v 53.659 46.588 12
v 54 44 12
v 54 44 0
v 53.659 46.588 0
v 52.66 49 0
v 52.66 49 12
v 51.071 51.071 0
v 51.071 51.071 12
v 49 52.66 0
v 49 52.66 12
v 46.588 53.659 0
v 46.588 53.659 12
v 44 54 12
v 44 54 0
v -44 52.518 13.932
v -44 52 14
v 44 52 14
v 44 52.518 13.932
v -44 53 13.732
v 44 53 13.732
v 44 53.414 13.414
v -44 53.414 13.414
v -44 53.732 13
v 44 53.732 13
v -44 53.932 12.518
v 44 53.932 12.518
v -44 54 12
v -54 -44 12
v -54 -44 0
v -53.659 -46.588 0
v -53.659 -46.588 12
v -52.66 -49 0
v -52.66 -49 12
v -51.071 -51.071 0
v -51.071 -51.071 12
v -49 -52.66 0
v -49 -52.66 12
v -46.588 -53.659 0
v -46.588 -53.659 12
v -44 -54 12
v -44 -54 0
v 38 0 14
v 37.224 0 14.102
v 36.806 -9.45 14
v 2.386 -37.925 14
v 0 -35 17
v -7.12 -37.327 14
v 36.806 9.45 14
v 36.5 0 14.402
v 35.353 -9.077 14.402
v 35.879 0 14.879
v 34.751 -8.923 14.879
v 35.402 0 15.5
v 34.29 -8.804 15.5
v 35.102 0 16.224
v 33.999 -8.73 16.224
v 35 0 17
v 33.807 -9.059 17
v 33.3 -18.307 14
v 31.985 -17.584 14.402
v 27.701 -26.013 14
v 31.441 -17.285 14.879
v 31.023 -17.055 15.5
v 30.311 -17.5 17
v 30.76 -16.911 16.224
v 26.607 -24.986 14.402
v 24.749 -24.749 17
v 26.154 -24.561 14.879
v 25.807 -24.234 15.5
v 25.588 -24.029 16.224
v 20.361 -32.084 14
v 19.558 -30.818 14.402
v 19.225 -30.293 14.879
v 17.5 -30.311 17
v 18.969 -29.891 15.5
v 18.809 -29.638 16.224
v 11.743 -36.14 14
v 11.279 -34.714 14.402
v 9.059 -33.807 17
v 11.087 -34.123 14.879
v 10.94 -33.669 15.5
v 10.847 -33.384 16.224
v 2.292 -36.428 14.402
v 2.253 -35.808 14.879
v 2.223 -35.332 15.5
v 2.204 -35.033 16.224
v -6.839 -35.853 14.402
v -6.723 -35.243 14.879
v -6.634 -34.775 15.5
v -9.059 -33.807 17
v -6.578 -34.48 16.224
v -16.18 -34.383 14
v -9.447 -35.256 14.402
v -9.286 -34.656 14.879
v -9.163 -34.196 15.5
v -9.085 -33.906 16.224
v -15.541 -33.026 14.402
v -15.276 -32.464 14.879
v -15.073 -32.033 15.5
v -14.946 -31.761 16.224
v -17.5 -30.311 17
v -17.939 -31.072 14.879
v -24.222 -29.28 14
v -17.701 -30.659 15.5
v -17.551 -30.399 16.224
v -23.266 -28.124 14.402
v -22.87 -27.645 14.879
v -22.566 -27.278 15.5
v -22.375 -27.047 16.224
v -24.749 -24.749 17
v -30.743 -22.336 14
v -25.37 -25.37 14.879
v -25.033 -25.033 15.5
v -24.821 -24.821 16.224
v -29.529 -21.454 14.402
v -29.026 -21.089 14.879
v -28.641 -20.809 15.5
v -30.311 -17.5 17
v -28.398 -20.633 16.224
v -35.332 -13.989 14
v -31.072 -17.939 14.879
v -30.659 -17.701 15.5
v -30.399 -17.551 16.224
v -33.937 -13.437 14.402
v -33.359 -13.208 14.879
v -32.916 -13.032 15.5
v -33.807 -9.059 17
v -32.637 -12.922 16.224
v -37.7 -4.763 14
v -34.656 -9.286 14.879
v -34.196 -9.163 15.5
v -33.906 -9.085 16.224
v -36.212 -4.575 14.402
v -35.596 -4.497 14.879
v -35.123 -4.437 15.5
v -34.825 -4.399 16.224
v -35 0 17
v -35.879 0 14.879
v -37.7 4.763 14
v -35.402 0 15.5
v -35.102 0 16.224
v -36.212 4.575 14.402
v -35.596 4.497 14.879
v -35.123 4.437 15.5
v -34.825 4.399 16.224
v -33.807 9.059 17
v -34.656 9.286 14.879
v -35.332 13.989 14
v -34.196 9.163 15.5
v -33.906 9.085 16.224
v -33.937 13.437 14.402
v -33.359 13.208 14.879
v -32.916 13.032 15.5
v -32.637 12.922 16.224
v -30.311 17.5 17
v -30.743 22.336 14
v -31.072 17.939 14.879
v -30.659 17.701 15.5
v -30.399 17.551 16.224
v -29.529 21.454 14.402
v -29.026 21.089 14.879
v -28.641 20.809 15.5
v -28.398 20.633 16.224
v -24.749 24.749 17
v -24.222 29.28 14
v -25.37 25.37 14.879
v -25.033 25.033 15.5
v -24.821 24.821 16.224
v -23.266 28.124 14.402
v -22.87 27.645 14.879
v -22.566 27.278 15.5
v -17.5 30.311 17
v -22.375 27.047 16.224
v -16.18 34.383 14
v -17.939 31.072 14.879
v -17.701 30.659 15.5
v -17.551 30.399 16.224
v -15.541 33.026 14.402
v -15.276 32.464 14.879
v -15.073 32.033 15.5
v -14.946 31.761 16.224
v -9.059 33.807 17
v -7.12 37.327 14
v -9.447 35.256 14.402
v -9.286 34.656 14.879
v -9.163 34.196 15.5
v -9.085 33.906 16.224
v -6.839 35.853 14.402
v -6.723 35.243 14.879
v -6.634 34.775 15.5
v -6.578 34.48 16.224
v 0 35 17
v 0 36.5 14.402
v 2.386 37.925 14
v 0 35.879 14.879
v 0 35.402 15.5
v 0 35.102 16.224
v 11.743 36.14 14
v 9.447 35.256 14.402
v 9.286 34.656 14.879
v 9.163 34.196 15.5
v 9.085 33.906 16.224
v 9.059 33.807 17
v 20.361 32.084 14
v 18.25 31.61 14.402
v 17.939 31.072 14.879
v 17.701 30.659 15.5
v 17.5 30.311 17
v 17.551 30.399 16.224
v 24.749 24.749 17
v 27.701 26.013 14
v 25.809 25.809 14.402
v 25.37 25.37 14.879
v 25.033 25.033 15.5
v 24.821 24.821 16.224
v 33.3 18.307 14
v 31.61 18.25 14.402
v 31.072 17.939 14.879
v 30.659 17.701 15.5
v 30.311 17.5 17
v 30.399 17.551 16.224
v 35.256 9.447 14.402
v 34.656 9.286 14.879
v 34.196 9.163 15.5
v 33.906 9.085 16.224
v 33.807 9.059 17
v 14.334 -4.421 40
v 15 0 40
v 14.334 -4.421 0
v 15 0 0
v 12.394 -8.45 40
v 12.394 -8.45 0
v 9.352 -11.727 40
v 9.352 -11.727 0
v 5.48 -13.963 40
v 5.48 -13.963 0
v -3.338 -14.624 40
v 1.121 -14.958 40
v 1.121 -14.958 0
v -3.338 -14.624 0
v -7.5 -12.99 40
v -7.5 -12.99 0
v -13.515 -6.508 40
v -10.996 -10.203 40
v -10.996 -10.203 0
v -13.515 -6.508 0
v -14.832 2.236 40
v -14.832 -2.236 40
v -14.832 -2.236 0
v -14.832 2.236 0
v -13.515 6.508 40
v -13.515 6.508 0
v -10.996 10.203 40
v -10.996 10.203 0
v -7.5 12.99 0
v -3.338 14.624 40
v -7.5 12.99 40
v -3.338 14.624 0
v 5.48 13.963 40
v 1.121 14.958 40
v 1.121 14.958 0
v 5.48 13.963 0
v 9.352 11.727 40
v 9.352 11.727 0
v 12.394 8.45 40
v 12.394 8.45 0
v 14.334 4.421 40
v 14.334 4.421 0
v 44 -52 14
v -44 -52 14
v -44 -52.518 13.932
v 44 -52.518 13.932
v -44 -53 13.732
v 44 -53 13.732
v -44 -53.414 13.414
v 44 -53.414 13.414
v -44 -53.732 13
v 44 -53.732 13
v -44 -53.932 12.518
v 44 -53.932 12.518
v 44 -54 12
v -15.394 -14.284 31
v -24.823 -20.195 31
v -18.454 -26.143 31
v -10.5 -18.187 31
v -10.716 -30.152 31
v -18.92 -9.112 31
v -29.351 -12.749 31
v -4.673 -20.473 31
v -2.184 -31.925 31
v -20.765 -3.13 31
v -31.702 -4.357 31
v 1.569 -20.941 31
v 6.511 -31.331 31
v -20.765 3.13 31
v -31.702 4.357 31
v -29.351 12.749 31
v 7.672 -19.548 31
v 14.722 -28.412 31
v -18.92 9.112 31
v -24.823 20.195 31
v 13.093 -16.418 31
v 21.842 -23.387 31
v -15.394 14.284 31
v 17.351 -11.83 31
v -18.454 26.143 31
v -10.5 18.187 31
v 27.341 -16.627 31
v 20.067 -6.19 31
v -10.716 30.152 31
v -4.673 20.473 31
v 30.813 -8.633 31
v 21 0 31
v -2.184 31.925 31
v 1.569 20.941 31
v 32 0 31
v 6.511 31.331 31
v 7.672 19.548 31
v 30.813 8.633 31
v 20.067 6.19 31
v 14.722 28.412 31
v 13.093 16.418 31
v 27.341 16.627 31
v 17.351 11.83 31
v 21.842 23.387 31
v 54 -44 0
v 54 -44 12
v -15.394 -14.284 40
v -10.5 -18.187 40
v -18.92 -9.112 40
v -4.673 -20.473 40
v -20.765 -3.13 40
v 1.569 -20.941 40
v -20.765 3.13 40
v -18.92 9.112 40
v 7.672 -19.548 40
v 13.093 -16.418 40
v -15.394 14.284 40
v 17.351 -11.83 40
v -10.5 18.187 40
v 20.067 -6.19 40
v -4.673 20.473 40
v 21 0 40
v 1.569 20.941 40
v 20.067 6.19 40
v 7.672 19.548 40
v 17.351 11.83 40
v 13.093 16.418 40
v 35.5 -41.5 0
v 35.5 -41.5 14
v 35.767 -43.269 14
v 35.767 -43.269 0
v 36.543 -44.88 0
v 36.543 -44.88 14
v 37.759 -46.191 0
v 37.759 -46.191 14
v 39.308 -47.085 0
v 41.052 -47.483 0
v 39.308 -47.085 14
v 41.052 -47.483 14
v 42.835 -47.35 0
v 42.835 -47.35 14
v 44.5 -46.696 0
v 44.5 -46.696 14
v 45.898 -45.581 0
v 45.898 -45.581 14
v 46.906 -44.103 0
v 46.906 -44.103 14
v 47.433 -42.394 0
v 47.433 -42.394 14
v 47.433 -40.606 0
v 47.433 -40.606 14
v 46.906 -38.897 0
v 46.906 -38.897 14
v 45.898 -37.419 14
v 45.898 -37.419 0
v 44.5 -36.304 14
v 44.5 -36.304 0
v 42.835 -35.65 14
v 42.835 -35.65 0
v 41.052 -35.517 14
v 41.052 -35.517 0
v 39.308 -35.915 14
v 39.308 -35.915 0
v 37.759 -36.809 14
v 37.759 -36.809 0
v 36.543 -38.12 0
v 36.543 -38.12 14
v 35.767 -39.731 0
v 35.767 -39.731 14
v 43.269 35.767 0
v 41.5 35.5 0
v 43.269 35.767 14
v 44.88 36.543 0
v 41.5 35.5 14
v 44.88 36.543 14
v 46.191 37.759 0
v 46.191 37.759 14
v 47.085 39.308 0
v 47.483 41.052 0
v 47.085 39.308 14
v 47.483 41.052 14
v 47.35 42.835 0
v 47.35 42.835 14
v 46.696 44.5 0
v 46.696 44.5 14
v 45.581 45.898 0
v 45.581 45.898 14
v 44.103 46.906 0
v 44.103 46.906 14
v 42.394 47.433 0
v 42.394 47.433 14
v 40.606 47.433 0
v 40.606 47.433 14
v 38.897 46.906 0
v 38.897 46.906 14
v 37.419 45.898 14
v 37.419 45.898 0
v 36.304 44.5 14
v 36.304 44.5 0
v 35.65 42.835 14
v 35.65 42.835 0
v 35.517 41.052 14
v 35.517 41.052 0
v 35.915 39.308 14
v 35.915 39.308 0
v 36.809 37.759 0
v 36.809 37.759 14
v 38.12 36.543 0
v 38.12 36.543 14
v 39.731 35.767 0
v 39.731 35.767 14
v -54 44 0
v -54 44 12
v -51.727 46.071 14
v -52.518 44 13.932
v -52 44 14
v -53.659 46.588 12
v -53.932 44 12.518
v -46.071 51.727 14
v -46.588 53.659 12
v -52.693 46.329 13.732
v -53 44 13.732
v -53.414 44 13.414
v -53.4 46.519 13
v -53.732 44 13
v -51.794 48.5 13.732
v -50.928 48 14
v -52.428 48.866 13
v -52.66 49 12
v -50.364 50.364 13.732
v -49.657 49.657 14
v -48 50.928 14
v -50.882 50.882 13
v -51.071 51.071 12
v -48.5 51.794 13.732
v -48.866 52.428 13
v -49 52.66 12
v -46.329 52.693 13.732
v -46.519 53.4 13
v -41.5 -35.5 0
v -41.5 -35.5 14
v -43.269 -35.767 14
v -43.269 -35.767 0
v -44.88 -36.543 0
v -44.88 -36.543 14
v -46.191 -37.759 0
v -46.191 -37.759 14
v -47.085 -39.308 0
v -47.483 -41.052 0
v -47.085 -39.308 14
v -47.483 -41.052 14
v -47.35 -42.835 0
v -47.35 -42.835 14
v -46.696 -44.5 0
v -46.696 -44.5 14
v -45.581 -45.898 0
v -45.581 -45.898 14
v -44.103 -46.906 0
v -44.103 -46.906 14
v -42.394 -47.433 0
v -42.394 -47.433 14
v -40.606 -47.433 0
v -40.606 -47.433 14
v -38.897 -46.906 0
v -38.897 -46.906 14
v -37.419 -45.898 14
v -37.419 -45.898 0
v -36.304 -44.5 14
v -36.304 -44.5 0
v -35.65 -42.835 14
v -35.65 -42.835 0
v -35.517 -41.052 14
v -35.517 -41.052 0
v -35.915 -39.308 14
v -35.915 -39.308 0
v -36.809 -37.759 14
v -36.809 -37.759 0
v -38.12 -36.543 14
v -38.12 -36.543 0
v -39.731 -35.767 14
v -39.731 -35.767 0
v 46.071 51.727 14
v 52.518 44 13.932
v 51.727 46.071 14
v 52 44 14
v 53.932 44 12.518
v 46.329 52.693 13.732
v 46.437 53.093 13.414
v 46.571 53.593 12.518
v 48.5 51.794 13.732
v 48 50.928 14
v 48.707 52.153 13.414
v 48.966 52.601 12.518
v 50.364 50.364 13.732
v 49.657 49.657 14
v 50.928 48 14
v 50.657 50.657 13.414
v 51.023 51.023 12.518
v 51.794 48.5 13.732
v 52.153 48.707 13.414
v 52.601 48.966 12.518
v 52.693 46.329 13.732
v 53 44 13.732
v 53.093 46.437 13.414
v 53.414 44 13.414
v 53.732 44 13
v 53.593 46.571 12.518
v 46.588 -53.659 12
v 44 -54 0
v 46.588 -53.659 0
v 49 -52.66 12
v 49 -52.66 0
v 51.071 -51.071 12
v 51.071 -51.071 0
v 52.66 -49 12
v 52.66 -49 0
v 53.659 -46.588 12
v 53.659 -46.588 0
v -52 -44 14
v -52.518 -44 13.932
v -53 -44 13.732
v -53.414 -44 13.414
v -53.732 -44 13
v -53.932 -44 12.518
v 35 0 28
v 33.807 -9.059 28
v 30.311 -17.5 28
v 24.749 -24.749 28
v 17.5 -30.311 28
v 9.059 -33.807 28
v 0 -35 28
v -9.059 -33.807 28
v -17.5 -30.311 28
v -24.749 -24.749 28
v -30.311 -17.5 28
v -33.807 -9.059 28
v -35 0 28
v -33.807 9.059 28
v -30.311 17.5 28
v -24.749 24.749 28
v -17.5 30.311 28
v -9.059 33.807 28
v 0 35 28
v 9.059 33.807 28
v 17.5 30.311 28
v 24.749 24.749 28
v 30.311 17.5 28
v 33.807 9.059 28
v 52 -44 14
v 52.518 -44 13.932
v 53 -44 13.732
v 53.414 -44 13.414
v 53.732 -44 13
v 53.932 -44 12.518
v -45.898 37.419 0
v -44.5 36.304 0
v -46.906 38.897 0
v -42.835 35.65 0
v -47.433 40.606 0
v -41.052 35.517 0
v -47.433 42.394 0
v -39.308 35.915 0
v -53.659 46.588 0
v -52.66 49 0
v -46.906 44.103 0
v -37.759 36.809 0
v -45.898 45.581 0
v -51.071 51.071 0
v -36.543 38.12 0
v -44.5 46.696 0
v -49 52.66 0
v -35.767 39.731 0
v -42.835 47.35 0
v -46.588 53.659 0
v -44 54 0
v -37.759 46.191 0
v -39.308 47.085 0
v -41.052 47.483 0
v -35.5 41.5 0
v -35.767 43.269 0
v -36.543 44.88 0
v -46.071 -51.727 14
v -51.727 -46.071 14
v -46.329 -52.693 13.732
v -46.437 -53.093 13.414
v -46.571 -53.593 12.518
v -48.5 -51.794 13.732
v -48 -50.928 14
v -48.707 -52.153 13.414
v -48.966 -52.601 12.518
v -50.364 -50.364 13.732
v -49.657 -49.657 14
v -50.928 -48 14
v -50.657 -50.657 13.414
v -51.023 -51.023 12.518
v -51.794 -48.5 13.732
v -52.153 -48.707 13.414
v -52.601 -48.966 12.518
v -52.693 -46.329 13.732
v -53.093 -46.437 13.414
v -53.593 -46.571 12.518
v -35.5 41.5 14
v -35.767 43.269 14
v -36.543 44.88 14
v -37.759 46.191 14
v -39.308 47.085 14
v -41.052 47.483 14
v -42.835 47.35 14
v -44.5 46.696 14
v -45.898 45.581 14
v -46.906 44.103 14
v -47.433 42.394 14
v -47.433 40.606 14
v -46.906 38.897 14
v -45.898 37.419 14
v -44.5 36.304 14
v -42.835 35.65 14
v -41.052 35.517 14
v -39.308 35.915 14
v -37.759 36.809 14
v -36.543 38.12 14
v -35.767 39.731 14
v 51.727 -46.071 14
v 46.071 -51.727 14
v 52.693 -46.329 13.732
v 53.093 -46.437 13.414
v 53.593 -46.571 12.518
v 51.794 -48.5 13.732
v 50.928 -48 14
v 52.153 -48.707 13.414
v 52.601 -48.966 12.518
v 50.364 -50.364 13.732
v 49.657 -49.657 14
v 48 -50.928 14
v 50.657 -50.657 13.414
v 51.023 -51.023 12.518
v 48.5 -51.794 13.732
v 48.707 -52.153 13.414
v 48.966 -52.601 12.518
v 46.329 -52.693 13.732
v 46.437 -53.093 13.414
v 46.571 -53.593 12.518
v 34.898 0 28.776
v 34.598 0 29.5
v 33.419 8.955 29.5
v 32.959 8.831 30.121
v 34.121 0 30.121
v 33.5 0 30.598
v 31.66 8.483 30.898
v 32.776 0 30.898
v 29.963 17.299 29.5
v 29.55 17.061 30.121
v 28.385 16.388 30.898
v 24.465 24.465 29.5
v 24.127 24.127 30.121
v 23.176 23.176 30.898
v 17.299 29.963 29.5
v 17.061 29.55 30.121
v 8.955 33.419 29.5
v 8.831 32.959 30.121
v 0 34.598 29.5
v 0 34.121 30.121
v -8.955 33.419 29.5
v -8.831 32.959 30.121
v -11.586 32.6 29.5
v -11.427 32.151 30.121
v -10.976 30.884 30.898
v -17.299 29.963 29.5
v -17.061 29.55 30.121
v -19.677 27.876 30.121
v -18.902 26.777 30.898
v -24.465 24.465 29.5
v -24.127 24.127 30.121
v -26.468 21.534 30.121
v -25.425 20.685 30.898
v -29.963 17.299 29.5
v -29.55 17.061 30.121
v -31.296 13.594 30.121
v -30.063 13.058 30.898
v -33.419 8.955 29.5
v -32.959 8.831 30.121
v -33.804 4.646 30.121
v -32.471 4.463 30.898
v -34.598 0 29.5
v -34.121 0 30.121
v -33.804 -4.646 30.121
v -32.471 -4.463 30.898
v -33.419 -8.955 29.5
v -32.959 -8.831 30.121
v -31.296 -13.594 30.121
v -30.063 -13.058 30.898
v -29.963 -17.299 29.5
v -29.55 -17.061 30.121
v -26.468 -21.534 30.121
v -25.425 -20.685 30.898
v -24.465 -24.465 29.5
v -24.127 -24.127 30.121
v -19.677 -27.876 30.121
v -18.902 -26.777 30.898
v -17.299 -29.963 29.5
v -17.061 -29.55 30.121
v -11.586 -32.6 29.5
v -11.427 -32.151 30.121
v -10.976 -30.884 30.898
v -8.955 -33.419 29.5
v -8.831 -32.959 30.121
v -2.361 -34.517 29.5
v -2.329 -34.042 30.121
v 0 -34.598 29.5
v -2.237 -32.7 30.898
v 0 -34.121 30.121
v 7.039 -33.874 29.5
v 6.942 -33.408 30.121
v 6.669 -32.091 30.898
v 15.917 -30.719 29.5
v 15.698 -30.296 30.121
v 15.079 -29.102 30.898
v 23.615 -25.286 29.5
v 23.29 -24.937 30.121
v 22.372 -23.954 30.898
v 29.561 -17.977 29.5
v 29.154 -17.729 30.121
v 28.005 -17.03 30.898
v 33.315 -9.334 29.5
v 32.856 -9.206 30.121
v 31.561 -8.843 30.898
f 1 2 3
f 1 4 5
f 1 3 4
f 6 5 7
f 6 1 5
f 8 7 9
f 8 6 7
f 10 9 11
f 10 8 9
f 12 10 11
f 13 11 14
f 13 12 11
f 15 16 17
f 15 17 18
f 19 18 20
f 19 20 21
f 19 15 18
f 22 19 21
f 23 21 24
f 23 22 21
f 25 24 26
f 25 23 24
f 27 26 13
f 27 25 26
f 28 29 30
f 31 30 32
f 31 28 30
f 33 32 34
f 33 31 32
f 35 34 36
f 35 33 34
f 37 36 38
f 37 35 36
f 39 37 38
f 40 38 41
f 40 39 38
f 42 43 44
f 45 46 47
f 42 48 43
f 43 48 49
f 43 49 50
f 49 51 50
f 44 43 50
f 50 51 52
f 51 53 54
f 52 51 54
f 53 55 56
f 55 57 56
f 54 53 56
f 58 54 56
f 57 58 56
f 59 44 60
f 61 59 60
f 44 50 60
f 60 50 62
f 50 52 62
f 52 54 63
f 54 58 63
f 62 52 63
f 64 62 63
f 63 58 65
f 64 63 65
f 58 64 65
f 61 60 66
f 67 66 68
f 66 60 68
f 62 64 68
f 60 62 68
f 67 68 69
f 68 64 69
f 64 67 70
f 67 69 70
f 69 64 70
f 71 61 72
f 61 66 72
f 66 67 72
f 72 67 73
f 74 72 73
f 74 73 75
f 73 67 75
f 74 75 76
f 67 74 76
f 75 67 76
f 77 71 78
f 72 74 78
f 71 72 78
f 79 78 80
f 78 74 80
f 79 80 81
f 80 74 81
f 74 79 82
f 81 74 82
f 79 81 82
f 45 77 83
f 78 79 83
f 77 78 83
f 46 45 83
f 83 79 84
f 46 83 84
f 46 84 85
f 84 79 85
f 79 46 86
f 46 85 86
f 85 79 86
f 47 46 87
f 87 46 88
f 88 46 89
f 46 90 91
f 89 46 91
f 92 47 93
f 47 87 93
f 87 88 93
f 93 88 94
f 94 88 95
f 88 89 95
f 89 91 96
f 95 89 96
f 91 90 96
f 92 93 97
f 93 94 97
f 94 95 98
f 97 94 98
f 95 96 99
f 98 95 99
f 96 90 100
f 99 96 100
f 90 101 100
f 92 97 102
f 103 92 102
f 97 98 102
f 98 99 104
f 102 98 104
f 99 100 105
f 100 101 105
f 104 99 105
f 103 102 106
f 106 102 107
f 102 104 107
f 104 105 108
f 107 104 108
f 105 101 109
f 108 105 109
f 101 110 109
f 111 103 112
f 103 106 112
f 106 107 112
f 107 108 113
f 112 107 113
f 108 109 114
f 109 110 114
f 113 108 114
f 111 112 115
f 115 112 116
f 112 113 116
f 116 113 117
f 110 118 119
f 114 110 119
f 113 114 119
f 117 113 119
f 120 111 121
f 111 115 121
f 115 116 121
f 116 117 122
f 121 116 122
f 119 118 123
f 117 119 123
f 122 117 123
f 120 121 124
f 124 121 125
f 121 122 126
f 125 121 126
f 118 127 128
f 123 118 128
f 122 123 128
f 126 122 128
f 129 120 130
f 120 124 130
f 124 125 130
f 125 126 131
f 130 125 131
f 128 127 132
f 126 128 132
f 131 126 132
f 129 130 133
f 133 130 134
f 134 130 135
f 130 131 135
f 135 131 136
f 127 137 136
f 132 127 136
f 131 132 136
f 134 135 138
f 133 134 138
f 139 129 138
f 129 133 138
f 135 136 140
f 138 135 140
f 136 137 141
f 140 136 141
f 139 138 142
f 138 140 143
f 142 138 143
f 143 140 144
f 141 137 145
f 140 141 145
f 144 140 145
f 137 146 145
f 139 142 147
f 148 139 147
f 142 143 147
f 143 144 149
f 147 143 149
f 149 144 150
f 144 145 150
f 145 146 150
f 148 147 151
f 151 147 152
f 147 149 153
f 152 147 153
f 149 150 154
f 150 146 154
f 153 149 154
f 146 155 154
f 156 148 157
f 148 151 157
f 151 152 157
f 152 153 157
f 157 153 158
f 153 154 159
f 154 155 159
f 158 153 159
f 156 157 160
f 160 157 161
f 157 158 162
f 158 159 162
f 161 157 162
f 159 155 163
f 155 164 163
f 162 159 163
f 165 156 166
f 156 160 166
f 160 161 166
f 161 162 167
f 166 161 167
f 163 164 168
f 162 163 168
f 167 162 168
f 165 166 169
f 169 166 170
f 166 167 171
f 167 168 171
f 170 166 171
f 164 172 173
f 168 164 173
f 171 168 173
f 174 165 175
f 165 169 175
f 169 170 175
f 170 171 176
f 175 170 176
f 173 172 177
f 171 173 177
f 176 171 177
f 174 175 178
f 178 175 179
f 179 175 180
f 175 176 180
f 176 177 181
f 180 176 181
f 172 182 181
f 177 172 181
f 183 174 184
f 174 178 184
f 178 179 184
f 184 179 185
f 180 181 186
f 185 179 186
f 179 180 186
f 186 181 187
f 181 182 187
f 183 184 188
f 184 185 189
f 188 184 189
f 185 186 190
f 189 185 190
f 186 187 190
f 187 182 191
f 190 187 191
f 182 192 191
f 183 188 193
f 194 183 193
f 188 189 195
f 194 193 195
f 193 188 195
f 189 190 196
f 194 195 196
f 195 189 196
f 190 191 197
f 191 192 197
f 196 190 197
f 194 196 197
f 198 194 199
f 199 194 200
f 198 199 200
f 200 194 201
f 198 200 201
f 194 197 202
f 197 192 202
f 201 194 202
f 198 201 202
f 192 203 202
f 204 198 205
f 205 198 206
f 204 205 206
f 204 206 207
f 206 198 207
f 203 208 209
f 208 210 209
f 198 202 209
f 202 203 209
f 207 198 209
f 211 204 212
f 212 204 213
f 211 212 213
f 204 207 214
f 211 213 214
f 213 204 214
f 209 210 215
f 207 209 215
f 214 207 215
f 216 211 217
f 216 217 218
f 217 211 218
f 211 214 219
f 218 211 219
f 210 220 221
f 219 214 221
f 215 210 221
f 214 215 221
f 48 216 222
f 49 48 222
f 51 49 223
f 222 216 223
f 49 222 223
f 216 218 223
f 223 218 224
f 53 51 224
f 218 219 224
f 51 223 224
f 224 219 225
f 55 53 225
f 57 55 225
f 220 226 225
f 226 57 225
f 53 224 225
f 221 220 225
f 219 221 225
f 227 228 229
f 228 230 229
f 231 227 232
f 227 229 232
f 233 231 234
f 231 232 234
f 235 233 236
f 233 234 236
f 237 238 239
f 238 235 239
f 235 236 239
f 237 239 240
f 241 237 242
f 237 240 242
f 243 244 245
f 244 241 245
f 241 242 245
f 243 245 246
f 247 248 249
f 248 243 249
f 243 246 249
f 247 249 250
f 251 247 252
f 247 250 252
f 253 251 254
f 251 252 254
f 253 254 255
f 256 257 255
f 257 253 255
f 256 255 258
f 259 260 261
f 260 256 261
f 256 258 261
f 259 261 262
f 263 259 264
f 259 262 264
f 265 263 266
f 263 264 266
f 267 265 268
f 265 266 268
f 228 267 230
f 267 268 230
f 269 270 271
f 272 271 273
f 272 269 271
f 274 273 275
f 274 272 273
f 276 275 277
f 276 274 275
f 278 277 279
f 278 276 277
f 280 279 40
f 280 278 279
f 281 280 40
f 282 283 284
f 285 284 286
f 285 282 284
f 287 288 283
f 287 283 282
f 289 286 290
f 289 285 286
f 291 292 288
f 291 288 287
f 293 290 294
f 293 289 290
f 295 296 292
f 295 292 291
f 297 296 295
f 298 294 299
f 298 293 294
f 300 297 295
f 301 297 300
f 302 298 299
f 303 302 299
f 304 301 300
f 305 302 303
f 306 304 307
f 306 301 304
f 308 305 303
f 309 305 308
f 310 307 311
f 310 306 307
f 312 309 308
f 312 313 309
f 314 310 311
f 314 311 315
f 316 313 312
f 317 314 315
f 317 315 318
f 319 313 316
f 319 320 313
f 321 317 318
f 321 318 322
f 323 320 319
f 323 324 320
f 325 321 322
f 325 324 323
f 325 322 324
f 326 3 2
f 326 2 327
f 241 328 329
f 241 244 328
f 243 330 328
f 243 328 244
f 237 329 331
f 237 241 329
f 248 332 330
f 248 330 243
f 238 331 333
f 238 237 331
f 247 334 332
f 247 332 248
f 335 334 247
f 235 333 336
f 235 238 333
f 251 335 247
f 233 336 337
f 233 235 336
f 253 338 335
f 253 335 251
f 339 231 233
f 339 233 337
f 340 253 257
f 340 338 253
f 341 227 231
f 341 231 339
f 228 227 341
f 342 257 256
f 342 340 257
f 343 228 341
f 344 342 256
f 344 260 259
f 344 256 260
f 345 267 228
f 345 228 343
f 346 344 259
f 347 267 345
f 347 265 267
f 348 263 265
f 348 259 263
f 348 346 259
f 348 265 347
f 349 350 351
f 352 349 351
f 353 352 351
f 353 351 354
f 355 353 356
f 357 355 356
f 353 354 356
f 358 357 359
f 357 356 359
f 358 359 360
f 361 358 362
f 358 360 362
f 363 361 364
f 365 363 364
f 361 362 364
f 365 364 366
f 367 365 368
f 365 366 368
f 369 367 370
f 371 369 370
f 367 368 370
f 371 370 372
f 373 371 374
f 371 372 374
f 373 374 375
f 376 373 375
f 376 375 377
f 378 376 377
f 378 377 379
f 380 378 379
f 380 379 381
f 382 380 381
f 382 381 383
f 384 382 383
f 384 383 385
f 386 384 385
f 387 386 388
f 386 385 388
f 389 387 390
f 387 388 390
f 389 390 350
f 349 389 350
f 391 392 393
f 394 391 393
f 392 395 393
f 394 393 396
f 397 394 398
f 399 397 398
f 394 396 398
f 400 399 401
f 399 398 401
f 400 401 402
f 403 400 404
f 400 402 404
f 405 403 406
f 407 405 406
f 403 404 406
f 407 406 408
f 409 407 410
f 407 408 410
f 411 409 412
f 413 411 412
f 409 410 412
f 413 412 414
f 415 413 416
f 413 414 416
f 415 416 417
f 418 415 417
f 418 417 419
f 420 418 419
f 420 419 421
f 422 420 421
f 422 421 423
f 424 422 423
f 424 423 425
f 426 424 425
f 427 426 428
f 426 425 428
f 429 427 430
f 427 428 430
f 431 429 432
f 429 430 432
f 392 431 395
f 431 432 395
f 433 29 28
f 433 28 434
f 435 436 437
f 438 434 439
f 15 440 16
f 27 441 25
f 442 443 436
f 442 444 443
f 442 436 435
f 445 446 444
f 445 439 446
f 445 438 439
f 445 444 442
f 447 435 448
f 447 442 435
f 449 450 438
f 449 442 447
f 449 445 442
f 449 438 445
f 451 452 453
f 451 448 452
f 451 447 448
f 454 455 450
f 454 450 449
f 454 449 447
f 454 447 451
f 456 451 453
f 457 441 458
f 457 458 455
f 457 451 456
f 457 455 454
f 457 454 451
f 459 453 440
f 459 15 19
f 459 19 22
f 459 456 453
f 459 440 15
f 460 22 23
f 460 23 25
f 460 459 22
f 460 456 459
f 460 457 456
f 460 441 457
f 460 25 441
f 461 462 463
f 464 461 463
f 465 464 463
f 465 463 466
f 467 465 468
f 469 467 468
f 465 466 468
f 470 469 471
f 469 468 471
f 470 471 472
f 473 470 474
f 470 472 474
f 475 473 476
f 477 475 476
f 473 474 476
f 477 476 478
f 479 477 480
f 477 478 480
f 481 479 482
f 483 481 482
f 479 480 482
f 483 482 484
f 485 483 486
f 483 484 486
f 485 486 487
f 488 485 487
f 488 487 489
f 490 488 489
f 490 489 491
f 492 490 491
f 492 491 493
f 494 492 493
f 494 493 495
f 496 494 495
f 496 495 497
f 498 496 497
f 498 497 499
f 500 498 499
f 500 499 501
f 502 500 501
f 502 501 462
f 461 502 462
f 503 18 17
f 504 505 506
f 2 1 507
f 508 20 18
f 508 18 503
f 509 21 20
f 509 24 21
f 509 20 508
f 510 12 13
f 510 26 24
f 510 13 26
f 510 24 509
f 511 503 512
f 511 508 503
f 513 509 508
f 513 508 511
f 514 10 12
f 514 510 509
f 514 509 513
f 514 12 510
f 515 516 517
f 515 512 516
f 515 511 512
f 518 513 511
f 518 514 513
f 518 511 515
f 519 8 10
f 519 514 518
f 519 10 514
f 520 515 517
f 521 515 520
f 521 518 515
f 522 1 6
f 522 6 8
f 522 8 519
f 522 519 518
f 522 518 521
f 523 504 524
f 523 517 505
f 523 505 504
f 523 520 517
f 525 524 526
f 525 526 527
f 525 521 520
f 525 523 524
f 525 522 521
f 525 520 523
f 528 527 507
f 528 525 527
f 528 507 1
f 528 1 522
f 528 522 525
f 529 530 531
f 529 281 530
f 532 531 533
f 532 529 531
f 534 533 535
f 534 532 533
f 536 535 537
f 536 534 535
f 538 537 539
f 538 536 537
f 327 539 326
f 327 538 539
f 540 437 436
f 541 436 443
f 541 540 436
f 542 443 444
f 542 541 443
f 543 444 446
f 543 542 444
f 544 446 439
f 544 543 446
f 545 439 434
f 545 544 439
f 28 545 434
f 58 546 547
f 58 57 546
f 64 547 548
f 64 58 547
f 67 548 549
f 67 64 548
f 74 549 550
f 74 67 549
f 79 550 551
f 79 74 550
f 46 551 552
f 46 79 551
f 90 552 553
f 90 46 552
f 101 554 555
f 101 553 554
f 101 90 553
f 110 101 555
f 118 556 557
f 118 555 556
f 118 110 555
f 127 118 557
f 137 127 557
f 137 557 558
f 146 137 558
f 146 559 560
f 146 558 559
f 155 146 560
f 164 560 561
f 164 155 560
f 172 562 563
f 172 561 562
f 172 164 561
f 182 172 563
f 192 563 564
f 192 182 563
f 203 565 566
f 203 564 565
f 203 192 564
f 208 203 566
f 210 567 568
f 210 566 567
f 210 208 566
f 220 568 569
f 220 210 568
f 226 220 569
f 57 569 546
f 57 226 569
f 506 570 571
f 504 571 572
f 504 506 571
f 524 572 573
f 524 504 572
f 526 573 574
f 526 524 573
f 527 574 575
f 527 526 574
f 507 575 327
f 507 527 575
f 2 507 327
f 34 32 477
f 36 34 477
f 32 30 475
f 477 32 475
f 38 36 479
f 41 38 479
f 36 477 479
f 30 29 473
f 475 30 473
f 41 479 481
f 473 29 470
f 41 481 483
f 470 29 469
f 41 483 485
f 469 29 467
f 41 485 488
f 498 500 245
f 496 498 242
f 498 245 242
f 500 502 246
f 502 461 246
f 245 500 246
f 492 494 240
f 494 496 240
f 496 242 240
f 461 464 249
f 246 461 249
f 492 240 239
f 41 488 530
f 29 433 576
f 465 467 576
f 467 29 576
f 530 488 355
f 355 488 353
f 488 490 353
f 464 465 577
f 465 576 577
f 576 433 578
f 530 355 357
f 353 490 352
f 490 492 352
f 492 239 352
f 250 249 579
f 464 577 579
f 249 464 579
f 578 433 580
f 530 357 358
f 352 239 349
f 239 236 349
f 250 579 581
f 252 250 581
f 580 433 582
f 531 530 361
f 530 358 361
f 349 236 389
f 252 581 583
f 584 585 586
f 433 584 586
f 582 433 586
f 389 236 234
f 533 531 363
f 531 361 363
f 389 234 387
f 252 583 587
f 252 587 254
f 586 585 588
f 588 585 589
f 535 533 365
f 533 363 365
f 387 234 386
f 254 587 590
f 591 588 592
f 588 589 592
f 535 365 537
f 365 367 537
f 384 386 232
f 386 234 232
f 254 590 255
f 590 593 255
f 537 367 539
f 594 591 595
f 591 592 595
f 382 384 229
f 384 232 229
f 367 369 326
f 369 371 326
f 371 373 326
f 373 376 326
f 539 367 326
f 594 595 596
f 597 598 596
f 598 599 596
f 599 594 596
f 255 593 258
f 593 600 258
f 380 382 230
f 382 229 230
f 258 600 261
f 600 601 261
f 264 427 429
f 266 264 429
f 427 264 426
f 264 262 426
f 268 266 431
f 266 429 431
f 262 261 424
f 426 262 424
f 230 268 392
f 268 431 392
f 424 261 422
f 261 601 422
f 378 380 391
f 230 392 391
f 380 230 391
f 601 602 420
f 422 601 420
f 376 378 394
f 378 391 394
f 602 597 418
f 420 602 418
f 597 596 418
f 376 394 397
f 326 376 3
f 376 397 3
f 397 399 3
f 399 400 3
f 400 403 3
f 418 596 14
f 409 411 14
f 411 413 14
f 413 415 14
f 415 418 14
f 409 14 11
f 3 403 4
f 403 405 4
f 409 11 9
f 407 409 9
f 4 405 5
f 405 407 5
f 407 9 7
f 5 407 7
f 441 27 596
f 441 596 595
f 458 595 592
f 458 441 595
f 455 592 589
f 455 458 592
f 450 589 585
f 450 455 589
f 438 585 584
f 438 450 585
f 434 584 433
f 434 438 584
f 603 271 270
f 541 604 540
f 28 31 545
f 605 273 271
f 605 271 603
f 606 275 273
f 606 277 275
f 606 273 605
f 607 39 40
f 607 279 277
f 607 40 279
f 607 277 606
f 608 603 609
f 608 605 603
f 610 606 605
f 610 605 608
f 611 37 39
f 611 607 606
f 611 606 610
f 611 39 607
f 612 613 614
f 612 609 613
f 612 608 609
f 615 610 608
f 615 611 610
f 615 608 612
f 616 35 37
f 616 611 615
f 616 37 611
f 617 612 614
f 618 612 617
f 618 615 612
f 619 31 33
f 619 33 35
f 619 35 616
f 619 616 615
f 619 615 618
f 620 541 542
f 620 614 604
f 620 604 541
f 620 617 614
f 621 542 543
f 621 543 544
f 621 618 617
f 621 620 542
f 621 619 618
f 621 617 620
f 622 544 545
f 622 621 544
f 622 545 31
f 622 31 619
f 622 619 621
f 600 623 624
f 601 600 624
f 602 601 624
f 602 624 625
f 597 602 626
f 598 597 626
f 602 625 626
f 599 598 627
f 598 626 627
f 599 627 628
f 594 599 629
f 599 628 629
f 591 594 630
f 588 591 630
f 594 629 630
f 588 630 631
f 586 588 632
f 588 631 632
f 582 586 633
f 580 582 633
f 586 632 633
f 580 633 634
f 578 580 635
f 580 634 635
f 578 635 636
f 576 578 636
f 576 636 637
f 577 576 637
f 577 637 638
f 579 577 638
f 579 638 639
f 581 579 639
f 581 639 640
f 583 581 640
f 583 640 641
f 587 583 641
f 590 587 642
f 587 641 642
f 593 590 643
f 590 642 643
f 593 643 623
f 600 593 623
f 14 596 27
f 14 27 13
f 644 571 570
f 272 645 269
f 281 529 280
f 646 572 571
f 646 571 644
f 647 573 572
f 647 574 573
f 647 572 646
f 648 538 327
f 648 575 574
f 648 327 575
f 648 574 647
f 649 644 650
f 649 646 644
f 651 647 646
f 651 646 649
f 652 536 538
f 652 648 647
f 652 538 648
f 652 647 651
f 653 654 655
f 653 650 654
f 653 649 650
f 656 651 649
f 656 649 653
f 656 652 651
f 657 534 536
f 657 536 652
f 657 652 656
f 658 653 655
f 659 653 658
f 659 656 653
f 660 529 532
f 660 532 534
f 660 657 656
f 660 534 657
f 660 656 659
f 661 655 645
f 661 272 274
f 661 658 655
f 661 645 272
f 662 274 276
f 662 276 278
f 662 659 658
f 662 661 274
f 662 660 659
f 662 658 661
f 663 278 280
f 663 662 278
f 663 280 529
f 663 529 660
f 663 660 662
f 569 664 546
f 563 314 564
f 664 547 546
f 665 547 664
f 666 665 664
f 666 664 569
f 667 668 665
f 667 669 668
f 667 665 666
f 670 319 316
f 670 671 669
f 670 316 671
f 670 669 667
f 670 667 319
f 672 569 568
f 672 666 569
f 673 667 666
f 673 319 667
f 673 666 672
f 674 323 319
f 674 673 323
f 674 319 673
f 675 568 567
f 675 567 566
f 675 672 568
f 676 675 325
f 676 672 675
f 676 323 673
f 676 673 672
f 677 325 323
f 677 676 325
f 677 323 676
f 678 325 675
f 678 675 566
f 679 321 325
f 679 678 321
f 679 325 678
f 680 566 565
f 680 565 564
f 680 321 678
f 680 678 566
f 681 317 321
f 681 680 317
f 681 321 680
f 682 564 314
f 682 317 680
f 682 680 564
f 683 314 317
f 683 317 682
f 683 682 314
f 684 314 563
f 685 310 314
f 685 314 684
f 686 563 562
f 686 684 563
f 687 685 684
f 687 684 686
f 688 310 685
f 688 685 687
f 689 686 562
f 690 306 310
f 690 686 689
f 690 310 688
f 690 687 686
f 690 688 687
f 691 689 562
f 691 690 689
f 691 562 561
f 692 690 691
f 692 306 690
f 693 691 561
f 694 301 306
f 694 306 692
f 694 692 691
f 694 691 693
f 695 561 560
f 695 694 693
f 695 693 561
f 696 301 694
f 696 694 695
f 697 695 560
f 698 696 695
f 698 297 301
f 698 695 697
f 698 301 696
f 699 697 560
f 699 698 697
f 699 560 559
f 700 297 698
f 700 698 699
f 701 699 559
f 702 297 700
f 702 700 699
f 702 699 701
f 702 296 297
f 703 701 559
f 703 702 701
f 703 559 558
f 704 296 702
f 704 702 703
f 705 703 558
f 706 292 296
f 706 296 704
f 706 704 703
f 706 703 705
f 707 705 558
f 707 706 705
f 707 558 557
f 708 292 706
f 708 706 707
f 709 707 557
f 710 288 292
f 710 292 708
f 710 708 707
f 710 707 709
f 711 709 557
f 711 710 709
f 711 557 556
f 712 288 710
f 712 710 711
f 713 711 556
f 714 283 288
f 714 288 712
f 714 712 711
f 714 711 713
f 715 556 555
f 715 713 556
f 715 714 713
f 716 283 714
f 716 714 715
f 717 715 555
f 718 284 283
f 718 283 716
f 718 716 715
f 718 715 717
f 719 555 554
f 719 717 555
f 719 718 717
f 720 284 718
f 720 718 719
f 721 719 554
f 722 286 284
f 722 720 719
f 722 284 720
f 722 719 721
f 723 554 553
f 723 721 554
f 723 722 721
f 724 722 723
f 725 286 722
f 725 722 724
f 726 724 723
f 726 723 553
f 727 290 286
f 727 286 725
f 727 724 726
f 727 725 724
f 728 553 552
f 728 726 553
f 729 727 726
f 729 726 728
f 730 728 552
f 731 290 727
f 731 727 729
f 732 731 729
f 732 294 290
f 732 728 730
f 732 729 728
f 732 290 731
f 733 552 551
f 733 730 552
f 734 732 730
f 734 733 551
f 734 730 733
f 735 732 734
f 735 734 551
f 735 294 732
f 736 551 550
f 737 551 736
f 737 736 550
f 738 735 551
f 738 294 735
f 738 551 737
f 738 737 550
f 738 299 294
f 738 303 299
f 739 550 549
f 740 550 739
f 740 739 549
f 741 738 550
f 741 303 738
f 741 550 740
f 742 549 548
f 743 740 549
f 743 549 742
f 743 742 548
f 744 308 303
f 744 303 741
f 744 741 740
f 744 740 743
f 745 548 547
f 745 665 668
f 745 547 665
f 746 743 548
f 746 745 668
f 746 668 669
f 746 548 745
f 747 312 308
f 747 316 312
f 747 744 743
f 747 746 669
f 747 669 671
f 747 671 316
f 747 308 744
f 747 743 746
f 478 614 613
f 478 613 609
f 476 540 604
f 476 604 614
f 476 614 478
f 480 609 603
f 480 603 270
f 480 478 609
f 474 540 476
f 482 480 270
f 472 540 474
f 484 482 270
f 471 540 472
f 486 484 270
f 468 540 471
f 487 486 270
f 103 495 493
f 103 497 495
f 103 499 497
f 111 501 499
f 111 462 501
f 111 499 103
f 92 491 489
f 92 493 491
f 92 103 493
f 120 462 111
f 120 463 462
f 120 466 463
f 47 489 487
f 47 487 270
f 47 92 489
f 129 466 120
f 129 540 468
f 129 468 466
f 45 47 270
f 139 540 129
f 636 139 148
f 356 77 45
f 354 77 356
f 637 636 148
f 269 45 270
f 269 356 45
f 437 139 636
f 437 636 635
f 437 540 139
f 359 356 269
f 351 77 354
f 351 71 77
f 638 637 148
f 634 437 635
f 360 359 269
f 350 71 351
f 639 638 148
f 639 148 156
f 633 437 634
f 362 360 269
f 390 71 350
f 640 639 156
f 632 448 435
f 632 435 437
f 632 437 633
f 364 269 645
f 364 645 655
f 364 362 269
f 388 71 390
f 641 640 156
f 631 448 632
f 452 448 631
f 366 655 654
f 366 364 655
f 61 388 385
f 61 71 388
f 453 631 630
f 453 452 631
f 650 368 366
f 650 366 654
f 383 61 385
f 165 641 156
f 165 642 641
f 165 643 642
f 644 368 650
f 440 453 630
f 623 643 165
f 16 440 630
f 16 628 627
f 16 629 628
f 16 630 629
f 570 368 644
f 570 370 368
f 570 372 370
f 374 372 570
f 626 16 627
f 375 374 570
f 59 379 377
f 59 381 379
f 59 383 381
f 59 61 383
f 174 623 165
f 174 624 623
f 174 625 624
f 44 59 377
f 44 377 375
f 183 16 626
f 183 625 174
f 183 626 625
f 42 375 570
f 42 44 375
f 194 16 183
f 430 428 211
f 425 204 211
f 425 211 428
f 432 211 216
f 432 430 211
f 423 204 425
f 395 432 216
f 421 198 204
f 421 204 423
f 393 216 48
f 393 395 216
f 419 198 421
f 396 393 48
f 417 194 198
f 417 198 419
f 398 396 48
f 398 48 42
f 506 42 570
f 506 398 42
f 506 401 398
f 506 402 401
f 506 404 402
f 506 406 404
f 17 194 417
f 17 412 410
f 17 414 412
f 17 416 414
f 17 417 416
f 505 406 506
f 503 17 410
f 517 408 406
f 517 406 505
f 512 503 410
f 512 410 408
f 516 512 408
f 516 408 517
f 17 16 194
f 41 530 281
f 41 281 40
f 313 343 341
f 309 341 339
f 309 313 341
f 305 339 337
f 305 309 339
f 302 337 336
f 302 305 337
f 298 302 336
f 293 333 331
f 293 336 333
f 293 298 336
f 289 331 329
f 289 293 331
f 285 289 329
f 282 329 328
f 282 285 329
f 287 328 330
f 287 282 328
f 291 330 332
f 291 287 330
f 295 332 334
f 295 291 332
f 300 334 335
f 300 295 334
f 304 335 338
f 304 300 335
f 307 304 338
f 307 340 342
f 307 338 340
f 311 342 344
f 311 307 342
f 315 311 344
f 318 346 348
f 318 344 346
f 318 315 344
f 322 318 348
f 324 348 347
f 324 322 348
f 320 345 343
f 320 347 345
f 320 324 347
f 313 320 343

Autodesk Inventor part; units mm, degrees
ref_plane "YZ Plane" through (0, 0, 0) normal (1, 0, 0) x (0, 1, 0)
ref_plane "XZ Plane" through (0, 0, 0) normal (0, 1, 0) x (-1, 0, 0)
ref_plane "XY Plane" through (0, 0, 0) normal (0, 0, 1) x (1, 0, 0)
sketch "Sketch1" plane through (0, 0, 0) normal (0, 0, 1) x (1, 0, 0)
  line L0 (-54, 54) -> (54, 54)
  line L1 (54, 54) -> (54, -54)
  line L2 (54, -54) -> (-54, -54)
  line L3 (-54, -54) -> (-54, 54)
  line L4 (-54, 54) -> (54, -54) construction
  line L5 (54, 54) -> (-54, -54) construction
  point P0 (0, 0)
  dimension "d0" = 108
extrude "Extrusion1" add sketch "Sketch1" along normal blind 14
sketch "Sketch2" plane through (0, 0, 14) normal (0, 0, 1) x (1, 0, 0)
  circle A0 centre (-41.5, 41.5) radius 6
  line L0 (54, 54) -> (-54, 54) construction
  line L1 (-54, 54) -> (0, 0) construction
  dimension "d4" = 41.5
  dimension "d5" = 12
extrude "Extrusion2" cut sketch "Sketch2" against normal through all
pattern_circular "Circular Pattern1" count 4 over 360 about axis through (0, 0, -10) along (0, 0, 1) of "Extrusion2"
fillet "Fillet1" radius 10 4 edges at (-54, 54, 7) (54, 54, 7) (-54, -54, 7) (54, -54, 7)
sketch "Sketch4" plane through (0, 0, 0) normal (0, 0, 1) x (1, 0, 0)
  circle A0 centre (0, 0) radius 35
  dimension "d15" = 70
extrude "Extrusion4" add sketch "Sketch4" along normal blind 31
sketch "Sketch5" plane through (0, 0, 0) normal (0, 0, 1) x (1, 0, 0)
  circle A0 centre (0, 0) radius 15
  dimension "d18" = 30
extrude "Extrusion5" cut sketch "Sketch5" along normal blind 31
sketch "Sketch6" plane through (0, 0, 0) normal (0, 0, 1) x (1, 0, 0)
  circle A0 centre (0, 0) radius 15 projected
  circle A1 centre (0, 0) radius 21
  dimension "d21" = 6
extrude "Extrusion6" add sketch "Sketch6" along normal blind 40
fillet "Fillet2" radius 3 2 edges at (-35, 0, 31) (-35, 0, 14)
fillet "Fillet3" radius 2 8 edges at (-51.0711, 51.0711, 14) (-54, 0, 14) (-51.0711, -51.0711, 14) (0, -54, 14) (51.0711, -51.0711, 14) (54, 0, 14) (51.0711, 51.0711, 14) (0, 54, 14)
properties part number "NDM-VOS dummy Disc Harrow Pillow block bearing mount Assembly"
